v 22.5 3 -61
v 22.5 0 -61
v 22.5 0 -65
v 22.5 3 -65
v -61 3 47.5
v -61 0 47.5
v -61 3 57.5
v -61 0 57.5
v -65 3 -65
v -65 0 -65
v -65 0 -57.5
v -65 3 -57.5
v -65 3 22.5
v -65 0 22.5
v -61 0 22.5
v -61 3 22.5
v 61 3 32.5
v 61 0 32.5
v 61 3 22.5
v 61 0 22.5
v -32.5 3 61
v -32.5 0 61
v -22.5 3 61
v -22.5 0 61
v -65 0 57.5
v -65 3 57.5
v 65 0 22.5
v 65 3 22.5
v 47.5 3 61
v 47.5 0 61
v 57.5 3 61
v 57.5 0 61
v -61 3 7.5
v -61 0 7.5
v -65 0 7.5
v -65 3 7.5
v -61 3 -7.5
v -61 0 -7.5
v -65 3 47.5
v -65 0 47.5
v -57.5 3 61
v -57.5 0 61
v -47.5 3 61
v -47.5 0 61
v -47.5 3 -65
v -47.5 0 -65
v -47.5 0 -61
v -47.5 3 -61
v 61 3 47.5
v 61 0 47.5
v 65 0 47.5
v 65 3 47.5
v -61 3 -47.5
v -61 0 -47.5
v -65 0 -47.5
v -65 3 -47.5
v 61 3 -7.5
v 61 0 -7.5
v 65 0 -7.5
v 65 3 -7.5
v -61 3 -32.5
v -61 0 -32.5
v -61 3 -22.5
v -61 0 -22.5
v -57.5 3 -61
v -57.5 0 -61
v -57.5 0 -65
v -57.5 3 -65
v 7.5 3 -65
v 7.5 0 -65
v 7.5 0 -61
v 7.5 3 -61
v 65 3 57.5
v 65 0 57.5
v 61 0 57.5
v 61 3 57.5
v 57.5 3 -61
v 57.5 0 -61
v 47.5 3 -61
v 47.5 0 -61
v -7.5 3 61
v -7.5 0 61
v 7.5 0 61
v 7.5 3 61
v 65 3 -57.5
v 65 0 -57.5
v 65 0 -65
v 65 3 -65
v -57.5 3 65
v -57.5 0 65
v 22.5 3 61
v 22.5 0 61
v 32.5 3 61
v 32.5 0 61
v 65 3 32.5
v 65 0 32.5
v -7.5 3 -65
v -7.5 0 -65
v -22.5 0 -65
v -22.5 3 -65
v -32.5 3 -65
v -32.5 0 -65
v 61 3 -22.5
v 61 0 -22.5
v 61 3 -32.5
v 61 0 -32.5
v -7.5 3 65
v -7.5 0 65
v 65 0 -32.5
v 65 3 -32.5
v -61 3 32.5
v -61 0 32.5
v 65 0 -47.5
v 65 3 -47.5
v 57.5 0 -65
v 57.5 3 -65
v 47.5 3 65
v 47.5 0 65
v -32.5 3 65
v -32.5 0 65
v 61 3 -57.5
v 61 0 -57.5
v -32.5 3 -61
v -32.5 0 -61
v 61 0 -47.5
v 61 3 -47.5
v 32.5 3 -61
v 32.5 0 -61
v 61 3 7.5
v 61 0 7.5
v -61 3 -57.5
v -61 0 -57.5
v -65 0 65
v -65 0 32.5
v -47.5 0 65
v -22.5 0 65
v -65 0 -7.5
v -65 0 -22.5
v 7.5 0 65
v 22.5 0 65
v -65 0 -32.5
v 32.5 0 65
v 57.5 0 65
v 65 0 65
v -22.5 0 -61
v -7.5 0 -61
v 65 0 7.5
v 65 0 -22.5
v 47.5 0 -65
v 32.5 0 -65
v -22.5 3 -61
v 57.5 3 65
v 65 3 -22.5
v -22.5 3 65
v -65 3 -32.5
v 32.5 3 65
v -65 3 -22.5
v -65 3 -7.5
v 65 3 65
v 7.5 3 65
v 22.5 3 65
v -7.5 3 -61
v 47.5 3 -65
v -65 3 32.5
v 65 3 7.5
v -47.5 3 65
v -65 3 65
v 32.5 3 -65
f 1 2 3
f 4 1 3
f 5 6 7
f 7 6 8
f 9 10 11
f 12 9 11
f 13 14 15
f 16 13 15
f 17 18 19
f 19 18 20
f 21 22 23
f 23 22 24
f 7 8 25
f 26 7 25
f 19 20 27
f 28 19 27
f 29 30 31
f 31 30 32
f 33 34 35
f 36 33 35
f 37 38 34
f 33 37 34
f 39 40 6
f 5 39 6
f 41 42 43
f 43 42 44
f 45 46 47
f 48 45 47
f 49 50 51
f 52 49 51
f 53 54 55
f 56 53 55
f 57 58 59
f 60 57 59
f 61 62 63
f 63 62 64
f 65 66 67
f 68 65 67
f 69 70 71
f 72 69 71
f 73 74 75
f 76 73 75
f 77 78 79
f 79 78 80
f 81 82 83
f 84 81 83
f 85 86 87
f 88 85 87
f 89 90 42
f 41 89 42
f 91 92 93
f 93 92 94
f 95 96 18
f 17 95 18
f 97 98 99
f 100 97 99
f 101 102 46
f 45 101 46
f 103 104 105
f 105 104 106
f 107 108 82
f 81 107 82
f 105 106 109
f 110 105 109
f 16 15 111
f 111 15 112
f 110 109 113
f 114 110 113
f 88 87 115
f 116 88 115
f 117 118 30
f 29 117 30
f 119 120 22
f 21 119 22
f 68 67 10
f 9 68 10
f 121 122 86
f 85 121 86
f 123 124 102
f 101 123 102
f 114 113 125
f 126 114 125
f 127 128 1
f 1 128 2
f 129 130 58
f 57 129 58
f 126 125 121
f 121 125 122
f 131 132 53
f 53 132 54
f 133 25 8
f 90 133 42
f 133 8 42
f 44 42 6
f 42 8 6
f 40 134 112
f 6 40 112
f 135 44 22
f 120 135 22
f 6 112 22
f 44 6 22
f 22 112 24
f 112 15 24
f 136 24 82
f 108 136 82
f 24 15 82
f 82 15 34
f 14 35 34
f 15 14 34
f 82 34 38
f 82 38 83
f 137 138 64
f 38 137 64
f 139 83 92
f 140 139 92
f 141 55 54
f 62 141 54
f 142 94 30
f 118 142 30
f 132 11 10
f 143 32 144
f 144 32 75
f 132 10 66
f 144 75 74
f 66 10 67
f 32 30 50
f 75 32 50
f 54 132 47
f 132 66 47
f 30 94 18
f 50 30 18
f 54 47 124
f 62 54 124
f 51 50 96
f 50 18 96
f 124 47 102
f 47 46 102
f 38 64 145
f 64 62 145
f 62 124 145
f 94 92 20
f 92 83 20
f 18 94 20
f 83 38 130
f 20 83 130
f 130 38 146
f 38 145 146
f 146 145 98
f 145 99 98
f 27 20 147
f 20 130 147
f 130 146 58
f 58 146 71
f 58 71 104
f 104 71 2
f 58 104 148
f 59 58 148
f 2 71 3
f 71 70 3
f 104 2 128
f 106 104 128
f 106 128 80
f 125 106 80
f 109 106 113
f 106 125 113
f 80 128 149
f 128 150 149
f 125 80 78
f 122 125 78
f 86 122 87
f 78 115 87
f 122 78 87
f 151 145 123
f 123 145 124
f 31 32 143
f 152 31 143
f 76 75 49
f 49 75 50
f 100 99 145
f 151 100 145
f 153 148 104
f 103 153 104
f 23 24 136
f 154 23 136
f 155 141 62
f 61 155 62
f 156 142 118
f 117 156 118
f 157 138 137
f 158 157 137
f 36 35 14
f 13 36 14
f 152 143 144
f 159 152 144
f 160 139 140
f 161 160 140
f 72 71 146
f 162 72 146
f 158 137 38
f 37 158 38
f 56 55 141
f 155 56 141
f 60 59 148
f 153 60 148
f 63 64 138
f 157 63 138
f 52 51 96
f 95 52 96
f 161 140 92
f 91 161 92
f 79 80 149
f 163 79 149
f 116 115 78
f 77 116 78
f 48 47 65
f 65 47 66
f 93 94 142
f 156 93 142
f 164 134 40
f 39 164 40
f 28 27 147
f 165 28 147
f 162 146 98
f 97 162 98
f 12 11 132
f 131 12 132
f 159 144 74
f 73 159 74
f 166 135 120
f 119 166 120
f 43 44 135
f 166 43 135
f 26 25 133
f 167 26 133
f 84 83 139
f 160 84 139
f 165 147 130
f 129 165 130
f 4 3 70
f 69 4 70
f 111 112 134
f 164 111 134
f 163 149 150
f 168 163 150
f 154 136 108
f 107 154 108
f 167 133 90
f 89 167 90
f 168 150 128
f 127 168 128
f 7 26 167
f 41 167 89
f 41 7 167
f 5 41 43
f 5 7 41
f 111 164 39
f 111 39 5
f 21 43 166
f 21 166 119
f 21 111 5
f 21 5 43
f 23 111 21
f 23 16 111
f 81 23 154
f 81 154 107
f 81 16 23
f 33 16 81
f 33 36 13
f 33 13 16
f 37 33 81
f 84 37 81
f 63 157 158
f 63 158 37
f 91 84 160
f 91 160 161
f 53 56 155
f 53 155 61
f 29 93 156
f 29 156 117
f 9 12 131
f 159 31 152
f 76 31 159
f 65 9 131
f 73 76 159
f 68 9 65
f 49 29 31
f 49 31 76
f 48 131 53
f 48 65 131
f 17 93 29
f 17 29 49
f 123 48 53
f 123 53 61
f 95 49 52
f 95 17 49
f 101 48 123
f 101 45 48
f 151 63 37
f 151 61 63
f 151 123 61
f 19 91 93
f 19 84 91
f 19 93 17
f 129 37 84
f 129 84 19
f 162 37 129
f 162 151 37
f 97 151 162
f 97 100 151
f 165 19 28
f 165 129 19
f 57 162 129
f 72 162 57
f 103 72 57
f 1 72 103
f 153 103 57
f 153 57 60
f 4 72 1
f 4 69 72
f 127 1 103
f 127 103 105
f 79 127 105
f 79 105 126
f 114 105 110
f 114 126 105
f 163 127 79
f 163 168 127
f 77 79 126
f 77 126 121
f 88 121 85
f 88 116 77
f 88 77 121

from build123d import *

# Parameters (mm, degrees)
BOSS_EXTRUDE1_DEPTH = 3


with BuildPart() as part:
    # Sketch1 → Boss-Extrude1 (new body)
    with BuildSketch(Plane(origin=(0, 0, 0), x_dir=(1, 0, 0), z_dir=(0, 1, 0))):
        Polygon((-65, -65), (-57.5, -65), (-57.5, -61), (-47.5, -61), (-47.5, -65), (-32.5, -65), (-32.5, -61), (-22.5, -61), (-22.5, -65), (-7.5, -65), (-7.5, -61), (7.5, -61), (7.5, -65), (22.5, -65), (22.5, -61), (32.5, -61), (32.5, -65), (47.5, -65), (47.5, -61), (57.5, -61), (57.5, -65), (65, -65), (65, -57.5), (61, -57.5), (61, -47.5), (65, -47.5), (65, -32.5), (61, -32.5), (61, -22.5), (65, -22.5), (65, -7.5), (61, -7.5), (61, 7.5), (65, 7.5), (65, 22.5), (61, 22.5), (61, 32.5), (65, 32.5), (65, 47.5), (61, 47.5), (61, 57.5), (65, 57.5), (65, 65), (57.5, 65), (57.5, 61), (47.5, 61), (47.5, 65), (32.5, 65), (32.5, 61), (22.5, 61), (22.5, 65), (7.5, 65), (7.5, 61), (-7.5, 61), (-7.5, 65), (-22.5, 65), (-22.5, 61), (-32.5, 61), (-32.5, 65), (-47.5, 65), (-47.5, 61), (-57.5, 61), (-57.5, 65), (-65, 65), (-65, 57.5), (-61, 57.5), (-61, 47.5), (-65, 47.5), (-65, 32.5), (-61, 32.5), (-61, 22.5), (-65, 22.5), (-65, 7.5), (-61, 7.5), (-61, -7.5), (-65, -7.5), (-65, -22.5), (-61, -22.5), (-61, -32.5), (-65, -32.5), (-65, -47.5), (-61, -47.5), (-61, -57.5), (-65, -57.5), align=None)
    extrude(amount=BOSS_EXTRUDE1_DEPTH)


solid = part.part
